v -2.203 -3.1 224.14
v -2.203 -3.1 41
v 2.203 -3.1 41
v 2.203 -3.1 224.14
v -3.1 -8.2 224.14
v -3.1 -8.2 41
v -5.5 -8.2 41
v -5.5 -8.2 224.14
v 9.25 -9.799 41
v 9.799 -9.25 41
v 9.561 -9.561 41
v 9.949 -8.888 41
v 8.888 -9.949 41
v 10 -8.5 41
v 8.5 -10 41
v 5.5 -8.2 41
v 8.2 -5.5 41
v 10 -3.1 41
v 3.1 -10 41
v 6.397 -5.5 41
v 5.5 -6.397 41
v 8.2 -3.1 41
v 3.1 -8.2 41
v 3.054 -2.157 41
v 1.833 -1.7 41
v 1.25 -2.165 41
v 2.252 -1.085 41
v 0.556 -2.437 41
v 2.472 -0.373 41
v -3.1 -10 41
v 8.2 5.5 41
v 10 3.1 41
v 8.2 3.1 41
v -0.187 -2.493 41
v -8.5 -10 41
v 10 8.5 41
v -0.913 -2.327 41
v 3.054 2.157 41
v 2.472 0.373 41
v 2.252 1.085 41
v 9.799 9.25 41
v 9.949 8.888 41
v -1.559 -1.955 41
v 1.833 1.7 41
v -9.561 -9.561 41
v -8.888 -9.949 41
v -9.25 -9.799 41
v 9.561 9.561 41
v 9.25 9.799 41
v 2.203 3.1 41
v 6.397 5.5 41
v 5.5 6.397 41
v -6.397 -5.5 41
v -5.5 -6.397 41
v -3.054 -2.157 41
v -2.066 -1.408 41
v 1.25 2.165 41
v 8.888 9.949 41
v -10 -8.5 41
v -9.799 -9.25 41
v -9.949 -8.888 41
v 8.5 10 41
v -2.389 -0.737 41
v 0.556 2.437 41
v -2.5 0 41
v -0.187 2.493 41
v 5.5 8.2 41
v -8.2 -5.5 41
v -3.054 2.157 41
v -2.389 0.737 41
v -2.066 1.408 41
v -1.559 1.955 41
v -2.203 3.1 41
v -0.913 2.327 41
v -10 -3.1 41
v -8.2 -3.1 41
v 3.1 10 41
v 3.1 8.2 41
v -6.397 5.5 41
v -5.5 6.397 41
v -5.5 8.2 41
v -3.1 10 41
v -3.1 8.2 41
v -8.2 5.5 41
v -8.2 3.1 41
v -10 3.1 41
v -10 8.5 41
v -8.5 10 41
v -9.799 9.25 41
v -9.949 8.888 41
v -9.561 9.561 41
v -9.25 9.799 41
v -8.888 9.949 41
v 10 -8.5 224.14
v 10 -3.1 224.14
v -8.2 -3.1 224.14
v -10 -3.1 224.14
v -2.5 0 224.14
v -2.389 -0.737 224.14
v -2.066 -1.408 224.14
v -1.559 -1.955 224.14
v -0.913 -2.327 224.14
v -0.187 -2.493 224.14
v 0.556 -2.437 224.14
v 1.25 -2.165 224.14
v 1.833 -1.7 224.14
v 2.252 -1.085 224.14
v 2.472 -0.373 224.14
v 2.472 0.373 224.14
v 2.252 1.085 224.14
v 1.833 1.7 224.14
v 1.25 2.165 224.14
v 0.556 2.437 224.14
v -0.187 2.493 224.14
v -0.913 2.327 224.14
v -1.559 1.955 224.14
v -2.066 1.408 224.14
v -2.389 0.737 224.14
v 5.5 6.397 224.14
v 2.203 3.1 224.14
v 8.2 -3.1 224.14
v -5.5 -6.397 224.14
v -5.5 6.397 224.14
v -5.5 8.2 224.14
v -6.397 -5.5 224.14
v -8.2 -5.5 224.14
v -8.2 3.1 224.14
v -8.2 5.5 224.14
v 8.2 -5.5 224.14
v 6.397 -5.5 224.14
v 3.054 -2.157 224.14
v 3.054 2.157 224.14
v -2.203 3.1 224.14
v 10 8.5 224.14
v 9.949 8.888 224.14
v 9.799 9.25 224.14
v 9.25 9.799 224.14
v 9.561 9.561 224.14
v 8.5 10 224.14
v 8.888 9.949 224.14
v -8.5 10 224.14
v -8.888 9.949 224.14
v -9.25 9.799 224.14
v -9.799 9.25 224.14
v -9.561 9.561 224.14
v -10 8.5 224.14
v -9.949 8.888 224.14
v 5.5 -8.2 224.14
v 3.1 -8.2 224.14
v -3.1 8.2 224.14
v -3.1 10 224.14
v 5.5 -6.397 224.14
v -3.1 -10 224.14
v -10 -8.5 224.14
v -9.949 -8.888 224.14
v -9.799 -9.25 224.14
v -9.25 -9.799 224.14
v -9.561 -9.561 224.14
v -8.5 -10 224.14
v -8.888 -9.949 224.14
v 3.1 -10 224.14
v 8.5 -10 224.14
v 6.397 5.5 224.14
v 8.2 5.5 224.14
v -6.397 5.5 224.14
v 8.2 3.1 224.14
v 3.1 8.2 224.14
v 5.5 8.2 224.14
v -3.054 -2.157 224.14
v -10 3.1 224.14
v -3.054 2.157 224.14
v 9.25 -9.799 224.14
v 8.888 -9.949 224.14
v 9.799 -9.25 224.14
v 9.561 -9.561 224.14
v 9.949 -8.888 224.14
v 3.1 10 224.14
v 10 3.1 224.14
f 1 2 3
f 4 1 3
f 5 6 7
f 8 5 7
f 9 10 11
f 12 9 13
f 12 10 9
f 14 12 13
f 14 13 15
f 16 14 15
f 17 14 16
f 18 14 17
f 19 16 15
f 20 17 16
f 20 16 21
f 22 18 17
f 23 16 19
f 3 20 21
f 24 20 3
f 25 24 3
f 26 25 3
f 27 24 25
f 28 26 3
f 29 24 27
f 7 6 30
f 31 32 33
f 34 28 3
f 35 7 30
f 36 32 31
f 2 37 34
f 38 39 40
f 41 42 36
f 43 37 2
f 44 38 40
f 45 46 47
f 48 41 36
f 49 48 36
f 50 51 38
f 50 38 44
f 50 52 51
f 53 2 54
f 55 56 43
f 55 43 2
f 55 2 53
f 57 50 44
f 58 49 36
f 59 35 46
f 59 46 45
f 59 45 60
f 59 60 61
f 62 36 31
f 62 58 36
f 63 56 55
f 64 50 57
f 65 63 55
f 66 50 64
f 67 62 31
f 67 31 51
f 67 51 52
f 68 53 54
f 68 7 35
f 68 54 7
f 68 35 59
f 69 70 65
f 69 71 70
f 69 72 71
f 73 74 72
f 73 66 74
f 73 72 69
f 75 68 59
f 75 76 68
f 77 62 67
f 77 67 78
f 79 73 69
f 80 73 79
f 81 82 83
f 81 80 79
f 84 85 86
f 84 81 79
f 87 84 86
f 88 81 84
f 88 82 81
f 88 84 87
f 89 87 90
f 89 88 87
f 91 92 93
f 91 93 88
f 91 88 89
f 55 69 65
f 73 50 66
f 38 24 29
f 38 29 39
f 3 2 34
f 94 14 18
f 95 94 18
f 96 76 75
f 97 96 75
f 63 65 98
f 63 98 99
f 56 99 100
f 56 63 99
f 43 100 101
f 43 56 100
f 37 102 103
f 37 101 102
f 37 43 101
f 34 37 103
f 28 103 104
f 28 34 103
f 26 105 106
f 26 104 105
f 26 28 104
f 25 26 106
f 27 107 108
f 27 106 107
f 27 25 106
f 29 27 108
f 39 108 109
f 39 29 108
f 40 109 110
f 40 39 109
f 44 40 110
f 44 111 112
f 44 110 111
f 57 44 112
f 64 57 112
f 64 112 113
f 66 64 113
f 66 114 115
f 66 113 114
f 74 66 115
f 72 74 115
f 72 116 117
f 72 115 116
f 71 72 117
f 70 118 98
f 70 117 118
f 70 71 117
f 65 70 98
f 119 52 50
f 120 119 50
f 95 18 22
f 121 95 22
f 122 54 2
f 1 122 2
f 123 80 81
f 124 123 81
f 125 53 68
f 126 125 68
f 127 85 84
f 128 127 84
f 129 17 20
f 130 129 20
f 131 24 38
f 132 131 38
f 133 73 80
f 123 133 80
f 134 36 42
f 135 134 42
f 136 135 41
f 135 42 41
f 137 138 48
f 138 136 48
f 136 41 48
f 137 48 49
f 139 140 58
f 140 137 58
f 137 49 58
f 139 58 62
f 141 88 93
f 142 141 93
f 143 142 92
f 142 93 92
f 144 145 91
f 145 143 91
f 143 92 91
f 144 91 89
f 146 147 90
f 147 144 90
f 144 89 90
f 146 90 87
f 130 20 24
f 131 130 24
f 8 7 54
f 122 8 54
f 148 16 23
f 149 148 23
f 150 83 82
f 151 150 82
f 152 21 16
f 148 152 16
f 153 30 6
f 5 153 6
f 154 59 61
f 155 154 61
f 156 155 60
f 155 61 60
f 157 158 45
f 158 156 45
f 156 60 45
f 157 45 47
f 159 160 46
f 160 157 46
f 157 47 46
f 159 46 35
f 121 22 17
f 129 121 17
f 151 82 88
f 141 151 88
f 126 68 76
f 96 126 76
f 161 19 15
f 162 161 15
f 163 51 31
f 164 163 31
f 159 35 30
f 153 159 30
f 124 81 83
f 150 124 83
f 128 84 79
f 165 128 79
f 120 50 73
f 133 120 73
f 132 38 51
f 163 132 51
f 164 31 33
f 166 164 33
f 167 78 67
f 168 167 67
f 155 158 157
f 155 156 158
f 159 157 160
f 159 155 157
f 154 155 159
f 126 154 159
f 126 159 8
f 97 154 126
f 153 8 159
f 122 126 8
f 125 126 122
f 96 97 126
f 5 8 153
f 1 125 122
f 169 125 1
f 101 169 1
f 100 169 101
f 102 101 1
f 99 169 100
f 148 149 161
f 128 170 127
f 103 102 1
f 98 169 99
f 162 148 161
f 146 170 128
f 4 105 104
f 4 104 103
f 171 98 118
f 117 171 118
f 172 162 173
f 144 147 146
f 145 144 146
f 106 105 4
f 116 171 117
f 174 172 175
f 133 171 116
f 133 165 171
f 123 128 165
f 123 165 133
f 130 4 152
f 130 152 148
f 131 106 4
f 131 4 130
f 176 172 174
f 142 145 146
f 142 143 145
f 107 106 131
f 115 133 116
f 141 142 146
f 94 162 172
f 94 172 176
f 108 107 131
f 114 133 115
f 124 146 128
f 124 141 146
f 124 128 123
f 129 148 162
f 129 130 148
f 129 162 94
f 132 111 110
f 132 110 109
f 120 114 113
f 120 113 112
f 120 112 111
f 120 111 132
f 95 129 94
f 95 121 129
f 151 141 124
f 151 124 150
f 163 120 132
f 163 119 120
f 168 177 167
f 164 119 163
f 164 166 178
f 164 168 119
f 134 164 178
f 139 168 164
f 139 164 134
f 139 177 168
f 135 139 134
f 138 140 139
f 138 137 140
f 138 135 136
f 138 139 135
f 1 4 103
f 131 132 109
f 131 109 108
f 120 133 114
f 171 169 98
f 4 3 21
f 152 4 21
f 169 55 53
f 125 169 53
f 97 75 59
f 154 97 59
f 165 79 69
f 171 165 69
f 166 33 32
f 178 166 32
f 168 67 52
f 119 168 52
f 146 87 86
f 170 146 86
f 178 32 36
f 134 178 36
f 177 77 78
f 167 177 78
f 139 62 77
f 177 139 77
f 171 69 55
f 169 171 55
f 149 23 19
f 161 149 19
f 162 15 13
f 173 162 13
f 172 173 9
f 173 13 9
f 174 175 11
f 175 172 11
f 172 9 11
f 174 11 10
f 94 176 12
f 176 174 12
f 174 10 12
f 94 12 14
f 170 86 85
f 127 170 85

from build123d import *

# Parameters (mm, degrees)
SKETCH_1_R          = 2.5
EXTRUDE_1_DEPTH     = 950
SKETCH_2_W          = 109.948268043
SKETCH_2_H          = 29.443949836
CUT_EXTRUDE_1_DEPTH = 725.86
SKETCH_5_W          = 99.378556311
SKETCH_5_H          = 151.459473896
CUT_EXTRUDE_2_DEPTH = 41


with BuildPart() as part:
    # 草图1 → 凸台-拉伸1 (new body)
    with BuildSketch(Plane.XY):
        with BuildLine():
            Line((-8.2, -3.1), (-10, -3.1))
            Line((-10, -3.1), (-10, -8.5))
            ThreePointArc((-10, -8.5), (-9.560660172, -9.560660172), (-8.5, -10))
            Line((-8.5, -10), (-3.1, -10))
            Line((-3.1, -10), (-3.1, -8.2))
            Line((-3.1, -8.2), (-5.5, -8.2))
            Line((-5.5, -8.2), (-5.5, -6.397050155))
            Line((-5.5, -6.397050155), (-2.202949845, -3.1))
            Line((-2.202949845, -3.1), (2.202949845, -3.1))
            Line((2.202949845, -3.1), (5.5, -6.397050155))
            Line((5.5, -6.397050155), (5.5, -8.2))
            Line((5.5, -8.2), (3.1, -8.2))
            Line((3.1, -8.2), (3.1, -10))
            Line((3.1, -10), (8.5, -10))
            ThreePointArc((8.5, -10), (9.560660172, -9.560660172), (10, -8.5))
            Line((10, -8.5), (10, -3.1))
            Line((10, -3.1), (8.2, -3.1))
            Line((8.2, -3.1), (8.2, -5.5))
            Line((8.2, -5.5), (6.397050155, -5.5))
            Line((6.397050155, -5.5), (3.05412702, -2.157076865))
            Line((3.05412702, -2.157076865), (3.05412702, 2.157076865))
            Line((3.05412702, 2.157076865), (6.397050155, 5.5))
            Line((6.397050155, 5.5), (8.2, 5.5))
            Line((8.2, 5.5), (8.2, 3.1))
            Line((8.2, 3.1), (10, 3.1))
            Line((10, 3.1), (10, 8.5))
            ThreePointArc((10, 8.5), (9.560660172, 9.560660172), (8.5, 10))
            Line((8.5, 10), (3.1, 10))
            Line((3.1, 10), (3.1, 8.2))
            Line((3.1, 8.2), (5.5, 8.2))
            Line((5.5, 8.2), (5.5, 6.397050155))
            Line((5.5, 6.397050155), (2.202949845, 3.1))
            Line((2.202949845, 3.1), (-2.202949845, 3.1))
            Line((-2.202949845, 3.1), (-5.5, 6.397050155))
            Line((-5.5, 6.397050155), (-5.5, 8.2))
            Line((-5.5, 8.2), (-3.1, 8.2))
            Line((-3.1, 8.2), (-3.1, 10))
            Line((-3.1, 10), (-8.5, 10))
            ThreePointArc((-8.5, 10), (-9.560660172, 9.560660172), (-10, 8.5))
            Line((-10, 8.5), (-10, 3.1))
            Line((-10, 3.1), (-8.2, 3.1))
            Line((-8.2, 3.1), (-8.2, 5.5))
            Line((-8.2, 5.5), (-6.397050155, 5.5))
            Line((-6.397050155, 5.5), (-3.05412702, 2.157076865))
            Line((-3.05412702, 2.157076865), (-3.05412702, -2.157076865))
            Line((-3.05412702, -2.157076865), (-6.397050155, -5.5))
            Line((-6.397050155, -5.5), (-8.2, -5.5))
            Line((-8.2, -5.5), (-8.2, -3.1))
        make_face()
        with Locations(Location((0, 0, 0), (0, 0, 180))):
            Circle(SKETCH_1_R, mode=Mode.SUBTRACT)
    extrude(amount=EXTRUDE_1_DEPTH)

    # 草图2 → 切除-拉伸1 (cut)
    with BuildSketch(Plane.XY.offset(950)):
        with Locations((27.511129311, -2.182282155)):
            Rectangle(SKETCH_2_W, SKETCH_2_H)
    extrude(amount=-CUT_EXTRUDE_1_DEPTH, mode=Mode.SUBTRACT)

    # 草图5 → 切除-拉伸2 (cut)
    with BuildSketch(Plane(origin=(0, 0, 0), x_dir=(-1, 0, 0), z_dir=(0, 0, -1))):
        with Locations((35.202237194, -44.495814053)):
            Rectangle(SKETCH_5_W, SKETCH_5_H)
    extrude(amount=-CUT_EXTRUDE_2_DEPTH, mode=Mode.SUBTRACT)


solid = part.part
